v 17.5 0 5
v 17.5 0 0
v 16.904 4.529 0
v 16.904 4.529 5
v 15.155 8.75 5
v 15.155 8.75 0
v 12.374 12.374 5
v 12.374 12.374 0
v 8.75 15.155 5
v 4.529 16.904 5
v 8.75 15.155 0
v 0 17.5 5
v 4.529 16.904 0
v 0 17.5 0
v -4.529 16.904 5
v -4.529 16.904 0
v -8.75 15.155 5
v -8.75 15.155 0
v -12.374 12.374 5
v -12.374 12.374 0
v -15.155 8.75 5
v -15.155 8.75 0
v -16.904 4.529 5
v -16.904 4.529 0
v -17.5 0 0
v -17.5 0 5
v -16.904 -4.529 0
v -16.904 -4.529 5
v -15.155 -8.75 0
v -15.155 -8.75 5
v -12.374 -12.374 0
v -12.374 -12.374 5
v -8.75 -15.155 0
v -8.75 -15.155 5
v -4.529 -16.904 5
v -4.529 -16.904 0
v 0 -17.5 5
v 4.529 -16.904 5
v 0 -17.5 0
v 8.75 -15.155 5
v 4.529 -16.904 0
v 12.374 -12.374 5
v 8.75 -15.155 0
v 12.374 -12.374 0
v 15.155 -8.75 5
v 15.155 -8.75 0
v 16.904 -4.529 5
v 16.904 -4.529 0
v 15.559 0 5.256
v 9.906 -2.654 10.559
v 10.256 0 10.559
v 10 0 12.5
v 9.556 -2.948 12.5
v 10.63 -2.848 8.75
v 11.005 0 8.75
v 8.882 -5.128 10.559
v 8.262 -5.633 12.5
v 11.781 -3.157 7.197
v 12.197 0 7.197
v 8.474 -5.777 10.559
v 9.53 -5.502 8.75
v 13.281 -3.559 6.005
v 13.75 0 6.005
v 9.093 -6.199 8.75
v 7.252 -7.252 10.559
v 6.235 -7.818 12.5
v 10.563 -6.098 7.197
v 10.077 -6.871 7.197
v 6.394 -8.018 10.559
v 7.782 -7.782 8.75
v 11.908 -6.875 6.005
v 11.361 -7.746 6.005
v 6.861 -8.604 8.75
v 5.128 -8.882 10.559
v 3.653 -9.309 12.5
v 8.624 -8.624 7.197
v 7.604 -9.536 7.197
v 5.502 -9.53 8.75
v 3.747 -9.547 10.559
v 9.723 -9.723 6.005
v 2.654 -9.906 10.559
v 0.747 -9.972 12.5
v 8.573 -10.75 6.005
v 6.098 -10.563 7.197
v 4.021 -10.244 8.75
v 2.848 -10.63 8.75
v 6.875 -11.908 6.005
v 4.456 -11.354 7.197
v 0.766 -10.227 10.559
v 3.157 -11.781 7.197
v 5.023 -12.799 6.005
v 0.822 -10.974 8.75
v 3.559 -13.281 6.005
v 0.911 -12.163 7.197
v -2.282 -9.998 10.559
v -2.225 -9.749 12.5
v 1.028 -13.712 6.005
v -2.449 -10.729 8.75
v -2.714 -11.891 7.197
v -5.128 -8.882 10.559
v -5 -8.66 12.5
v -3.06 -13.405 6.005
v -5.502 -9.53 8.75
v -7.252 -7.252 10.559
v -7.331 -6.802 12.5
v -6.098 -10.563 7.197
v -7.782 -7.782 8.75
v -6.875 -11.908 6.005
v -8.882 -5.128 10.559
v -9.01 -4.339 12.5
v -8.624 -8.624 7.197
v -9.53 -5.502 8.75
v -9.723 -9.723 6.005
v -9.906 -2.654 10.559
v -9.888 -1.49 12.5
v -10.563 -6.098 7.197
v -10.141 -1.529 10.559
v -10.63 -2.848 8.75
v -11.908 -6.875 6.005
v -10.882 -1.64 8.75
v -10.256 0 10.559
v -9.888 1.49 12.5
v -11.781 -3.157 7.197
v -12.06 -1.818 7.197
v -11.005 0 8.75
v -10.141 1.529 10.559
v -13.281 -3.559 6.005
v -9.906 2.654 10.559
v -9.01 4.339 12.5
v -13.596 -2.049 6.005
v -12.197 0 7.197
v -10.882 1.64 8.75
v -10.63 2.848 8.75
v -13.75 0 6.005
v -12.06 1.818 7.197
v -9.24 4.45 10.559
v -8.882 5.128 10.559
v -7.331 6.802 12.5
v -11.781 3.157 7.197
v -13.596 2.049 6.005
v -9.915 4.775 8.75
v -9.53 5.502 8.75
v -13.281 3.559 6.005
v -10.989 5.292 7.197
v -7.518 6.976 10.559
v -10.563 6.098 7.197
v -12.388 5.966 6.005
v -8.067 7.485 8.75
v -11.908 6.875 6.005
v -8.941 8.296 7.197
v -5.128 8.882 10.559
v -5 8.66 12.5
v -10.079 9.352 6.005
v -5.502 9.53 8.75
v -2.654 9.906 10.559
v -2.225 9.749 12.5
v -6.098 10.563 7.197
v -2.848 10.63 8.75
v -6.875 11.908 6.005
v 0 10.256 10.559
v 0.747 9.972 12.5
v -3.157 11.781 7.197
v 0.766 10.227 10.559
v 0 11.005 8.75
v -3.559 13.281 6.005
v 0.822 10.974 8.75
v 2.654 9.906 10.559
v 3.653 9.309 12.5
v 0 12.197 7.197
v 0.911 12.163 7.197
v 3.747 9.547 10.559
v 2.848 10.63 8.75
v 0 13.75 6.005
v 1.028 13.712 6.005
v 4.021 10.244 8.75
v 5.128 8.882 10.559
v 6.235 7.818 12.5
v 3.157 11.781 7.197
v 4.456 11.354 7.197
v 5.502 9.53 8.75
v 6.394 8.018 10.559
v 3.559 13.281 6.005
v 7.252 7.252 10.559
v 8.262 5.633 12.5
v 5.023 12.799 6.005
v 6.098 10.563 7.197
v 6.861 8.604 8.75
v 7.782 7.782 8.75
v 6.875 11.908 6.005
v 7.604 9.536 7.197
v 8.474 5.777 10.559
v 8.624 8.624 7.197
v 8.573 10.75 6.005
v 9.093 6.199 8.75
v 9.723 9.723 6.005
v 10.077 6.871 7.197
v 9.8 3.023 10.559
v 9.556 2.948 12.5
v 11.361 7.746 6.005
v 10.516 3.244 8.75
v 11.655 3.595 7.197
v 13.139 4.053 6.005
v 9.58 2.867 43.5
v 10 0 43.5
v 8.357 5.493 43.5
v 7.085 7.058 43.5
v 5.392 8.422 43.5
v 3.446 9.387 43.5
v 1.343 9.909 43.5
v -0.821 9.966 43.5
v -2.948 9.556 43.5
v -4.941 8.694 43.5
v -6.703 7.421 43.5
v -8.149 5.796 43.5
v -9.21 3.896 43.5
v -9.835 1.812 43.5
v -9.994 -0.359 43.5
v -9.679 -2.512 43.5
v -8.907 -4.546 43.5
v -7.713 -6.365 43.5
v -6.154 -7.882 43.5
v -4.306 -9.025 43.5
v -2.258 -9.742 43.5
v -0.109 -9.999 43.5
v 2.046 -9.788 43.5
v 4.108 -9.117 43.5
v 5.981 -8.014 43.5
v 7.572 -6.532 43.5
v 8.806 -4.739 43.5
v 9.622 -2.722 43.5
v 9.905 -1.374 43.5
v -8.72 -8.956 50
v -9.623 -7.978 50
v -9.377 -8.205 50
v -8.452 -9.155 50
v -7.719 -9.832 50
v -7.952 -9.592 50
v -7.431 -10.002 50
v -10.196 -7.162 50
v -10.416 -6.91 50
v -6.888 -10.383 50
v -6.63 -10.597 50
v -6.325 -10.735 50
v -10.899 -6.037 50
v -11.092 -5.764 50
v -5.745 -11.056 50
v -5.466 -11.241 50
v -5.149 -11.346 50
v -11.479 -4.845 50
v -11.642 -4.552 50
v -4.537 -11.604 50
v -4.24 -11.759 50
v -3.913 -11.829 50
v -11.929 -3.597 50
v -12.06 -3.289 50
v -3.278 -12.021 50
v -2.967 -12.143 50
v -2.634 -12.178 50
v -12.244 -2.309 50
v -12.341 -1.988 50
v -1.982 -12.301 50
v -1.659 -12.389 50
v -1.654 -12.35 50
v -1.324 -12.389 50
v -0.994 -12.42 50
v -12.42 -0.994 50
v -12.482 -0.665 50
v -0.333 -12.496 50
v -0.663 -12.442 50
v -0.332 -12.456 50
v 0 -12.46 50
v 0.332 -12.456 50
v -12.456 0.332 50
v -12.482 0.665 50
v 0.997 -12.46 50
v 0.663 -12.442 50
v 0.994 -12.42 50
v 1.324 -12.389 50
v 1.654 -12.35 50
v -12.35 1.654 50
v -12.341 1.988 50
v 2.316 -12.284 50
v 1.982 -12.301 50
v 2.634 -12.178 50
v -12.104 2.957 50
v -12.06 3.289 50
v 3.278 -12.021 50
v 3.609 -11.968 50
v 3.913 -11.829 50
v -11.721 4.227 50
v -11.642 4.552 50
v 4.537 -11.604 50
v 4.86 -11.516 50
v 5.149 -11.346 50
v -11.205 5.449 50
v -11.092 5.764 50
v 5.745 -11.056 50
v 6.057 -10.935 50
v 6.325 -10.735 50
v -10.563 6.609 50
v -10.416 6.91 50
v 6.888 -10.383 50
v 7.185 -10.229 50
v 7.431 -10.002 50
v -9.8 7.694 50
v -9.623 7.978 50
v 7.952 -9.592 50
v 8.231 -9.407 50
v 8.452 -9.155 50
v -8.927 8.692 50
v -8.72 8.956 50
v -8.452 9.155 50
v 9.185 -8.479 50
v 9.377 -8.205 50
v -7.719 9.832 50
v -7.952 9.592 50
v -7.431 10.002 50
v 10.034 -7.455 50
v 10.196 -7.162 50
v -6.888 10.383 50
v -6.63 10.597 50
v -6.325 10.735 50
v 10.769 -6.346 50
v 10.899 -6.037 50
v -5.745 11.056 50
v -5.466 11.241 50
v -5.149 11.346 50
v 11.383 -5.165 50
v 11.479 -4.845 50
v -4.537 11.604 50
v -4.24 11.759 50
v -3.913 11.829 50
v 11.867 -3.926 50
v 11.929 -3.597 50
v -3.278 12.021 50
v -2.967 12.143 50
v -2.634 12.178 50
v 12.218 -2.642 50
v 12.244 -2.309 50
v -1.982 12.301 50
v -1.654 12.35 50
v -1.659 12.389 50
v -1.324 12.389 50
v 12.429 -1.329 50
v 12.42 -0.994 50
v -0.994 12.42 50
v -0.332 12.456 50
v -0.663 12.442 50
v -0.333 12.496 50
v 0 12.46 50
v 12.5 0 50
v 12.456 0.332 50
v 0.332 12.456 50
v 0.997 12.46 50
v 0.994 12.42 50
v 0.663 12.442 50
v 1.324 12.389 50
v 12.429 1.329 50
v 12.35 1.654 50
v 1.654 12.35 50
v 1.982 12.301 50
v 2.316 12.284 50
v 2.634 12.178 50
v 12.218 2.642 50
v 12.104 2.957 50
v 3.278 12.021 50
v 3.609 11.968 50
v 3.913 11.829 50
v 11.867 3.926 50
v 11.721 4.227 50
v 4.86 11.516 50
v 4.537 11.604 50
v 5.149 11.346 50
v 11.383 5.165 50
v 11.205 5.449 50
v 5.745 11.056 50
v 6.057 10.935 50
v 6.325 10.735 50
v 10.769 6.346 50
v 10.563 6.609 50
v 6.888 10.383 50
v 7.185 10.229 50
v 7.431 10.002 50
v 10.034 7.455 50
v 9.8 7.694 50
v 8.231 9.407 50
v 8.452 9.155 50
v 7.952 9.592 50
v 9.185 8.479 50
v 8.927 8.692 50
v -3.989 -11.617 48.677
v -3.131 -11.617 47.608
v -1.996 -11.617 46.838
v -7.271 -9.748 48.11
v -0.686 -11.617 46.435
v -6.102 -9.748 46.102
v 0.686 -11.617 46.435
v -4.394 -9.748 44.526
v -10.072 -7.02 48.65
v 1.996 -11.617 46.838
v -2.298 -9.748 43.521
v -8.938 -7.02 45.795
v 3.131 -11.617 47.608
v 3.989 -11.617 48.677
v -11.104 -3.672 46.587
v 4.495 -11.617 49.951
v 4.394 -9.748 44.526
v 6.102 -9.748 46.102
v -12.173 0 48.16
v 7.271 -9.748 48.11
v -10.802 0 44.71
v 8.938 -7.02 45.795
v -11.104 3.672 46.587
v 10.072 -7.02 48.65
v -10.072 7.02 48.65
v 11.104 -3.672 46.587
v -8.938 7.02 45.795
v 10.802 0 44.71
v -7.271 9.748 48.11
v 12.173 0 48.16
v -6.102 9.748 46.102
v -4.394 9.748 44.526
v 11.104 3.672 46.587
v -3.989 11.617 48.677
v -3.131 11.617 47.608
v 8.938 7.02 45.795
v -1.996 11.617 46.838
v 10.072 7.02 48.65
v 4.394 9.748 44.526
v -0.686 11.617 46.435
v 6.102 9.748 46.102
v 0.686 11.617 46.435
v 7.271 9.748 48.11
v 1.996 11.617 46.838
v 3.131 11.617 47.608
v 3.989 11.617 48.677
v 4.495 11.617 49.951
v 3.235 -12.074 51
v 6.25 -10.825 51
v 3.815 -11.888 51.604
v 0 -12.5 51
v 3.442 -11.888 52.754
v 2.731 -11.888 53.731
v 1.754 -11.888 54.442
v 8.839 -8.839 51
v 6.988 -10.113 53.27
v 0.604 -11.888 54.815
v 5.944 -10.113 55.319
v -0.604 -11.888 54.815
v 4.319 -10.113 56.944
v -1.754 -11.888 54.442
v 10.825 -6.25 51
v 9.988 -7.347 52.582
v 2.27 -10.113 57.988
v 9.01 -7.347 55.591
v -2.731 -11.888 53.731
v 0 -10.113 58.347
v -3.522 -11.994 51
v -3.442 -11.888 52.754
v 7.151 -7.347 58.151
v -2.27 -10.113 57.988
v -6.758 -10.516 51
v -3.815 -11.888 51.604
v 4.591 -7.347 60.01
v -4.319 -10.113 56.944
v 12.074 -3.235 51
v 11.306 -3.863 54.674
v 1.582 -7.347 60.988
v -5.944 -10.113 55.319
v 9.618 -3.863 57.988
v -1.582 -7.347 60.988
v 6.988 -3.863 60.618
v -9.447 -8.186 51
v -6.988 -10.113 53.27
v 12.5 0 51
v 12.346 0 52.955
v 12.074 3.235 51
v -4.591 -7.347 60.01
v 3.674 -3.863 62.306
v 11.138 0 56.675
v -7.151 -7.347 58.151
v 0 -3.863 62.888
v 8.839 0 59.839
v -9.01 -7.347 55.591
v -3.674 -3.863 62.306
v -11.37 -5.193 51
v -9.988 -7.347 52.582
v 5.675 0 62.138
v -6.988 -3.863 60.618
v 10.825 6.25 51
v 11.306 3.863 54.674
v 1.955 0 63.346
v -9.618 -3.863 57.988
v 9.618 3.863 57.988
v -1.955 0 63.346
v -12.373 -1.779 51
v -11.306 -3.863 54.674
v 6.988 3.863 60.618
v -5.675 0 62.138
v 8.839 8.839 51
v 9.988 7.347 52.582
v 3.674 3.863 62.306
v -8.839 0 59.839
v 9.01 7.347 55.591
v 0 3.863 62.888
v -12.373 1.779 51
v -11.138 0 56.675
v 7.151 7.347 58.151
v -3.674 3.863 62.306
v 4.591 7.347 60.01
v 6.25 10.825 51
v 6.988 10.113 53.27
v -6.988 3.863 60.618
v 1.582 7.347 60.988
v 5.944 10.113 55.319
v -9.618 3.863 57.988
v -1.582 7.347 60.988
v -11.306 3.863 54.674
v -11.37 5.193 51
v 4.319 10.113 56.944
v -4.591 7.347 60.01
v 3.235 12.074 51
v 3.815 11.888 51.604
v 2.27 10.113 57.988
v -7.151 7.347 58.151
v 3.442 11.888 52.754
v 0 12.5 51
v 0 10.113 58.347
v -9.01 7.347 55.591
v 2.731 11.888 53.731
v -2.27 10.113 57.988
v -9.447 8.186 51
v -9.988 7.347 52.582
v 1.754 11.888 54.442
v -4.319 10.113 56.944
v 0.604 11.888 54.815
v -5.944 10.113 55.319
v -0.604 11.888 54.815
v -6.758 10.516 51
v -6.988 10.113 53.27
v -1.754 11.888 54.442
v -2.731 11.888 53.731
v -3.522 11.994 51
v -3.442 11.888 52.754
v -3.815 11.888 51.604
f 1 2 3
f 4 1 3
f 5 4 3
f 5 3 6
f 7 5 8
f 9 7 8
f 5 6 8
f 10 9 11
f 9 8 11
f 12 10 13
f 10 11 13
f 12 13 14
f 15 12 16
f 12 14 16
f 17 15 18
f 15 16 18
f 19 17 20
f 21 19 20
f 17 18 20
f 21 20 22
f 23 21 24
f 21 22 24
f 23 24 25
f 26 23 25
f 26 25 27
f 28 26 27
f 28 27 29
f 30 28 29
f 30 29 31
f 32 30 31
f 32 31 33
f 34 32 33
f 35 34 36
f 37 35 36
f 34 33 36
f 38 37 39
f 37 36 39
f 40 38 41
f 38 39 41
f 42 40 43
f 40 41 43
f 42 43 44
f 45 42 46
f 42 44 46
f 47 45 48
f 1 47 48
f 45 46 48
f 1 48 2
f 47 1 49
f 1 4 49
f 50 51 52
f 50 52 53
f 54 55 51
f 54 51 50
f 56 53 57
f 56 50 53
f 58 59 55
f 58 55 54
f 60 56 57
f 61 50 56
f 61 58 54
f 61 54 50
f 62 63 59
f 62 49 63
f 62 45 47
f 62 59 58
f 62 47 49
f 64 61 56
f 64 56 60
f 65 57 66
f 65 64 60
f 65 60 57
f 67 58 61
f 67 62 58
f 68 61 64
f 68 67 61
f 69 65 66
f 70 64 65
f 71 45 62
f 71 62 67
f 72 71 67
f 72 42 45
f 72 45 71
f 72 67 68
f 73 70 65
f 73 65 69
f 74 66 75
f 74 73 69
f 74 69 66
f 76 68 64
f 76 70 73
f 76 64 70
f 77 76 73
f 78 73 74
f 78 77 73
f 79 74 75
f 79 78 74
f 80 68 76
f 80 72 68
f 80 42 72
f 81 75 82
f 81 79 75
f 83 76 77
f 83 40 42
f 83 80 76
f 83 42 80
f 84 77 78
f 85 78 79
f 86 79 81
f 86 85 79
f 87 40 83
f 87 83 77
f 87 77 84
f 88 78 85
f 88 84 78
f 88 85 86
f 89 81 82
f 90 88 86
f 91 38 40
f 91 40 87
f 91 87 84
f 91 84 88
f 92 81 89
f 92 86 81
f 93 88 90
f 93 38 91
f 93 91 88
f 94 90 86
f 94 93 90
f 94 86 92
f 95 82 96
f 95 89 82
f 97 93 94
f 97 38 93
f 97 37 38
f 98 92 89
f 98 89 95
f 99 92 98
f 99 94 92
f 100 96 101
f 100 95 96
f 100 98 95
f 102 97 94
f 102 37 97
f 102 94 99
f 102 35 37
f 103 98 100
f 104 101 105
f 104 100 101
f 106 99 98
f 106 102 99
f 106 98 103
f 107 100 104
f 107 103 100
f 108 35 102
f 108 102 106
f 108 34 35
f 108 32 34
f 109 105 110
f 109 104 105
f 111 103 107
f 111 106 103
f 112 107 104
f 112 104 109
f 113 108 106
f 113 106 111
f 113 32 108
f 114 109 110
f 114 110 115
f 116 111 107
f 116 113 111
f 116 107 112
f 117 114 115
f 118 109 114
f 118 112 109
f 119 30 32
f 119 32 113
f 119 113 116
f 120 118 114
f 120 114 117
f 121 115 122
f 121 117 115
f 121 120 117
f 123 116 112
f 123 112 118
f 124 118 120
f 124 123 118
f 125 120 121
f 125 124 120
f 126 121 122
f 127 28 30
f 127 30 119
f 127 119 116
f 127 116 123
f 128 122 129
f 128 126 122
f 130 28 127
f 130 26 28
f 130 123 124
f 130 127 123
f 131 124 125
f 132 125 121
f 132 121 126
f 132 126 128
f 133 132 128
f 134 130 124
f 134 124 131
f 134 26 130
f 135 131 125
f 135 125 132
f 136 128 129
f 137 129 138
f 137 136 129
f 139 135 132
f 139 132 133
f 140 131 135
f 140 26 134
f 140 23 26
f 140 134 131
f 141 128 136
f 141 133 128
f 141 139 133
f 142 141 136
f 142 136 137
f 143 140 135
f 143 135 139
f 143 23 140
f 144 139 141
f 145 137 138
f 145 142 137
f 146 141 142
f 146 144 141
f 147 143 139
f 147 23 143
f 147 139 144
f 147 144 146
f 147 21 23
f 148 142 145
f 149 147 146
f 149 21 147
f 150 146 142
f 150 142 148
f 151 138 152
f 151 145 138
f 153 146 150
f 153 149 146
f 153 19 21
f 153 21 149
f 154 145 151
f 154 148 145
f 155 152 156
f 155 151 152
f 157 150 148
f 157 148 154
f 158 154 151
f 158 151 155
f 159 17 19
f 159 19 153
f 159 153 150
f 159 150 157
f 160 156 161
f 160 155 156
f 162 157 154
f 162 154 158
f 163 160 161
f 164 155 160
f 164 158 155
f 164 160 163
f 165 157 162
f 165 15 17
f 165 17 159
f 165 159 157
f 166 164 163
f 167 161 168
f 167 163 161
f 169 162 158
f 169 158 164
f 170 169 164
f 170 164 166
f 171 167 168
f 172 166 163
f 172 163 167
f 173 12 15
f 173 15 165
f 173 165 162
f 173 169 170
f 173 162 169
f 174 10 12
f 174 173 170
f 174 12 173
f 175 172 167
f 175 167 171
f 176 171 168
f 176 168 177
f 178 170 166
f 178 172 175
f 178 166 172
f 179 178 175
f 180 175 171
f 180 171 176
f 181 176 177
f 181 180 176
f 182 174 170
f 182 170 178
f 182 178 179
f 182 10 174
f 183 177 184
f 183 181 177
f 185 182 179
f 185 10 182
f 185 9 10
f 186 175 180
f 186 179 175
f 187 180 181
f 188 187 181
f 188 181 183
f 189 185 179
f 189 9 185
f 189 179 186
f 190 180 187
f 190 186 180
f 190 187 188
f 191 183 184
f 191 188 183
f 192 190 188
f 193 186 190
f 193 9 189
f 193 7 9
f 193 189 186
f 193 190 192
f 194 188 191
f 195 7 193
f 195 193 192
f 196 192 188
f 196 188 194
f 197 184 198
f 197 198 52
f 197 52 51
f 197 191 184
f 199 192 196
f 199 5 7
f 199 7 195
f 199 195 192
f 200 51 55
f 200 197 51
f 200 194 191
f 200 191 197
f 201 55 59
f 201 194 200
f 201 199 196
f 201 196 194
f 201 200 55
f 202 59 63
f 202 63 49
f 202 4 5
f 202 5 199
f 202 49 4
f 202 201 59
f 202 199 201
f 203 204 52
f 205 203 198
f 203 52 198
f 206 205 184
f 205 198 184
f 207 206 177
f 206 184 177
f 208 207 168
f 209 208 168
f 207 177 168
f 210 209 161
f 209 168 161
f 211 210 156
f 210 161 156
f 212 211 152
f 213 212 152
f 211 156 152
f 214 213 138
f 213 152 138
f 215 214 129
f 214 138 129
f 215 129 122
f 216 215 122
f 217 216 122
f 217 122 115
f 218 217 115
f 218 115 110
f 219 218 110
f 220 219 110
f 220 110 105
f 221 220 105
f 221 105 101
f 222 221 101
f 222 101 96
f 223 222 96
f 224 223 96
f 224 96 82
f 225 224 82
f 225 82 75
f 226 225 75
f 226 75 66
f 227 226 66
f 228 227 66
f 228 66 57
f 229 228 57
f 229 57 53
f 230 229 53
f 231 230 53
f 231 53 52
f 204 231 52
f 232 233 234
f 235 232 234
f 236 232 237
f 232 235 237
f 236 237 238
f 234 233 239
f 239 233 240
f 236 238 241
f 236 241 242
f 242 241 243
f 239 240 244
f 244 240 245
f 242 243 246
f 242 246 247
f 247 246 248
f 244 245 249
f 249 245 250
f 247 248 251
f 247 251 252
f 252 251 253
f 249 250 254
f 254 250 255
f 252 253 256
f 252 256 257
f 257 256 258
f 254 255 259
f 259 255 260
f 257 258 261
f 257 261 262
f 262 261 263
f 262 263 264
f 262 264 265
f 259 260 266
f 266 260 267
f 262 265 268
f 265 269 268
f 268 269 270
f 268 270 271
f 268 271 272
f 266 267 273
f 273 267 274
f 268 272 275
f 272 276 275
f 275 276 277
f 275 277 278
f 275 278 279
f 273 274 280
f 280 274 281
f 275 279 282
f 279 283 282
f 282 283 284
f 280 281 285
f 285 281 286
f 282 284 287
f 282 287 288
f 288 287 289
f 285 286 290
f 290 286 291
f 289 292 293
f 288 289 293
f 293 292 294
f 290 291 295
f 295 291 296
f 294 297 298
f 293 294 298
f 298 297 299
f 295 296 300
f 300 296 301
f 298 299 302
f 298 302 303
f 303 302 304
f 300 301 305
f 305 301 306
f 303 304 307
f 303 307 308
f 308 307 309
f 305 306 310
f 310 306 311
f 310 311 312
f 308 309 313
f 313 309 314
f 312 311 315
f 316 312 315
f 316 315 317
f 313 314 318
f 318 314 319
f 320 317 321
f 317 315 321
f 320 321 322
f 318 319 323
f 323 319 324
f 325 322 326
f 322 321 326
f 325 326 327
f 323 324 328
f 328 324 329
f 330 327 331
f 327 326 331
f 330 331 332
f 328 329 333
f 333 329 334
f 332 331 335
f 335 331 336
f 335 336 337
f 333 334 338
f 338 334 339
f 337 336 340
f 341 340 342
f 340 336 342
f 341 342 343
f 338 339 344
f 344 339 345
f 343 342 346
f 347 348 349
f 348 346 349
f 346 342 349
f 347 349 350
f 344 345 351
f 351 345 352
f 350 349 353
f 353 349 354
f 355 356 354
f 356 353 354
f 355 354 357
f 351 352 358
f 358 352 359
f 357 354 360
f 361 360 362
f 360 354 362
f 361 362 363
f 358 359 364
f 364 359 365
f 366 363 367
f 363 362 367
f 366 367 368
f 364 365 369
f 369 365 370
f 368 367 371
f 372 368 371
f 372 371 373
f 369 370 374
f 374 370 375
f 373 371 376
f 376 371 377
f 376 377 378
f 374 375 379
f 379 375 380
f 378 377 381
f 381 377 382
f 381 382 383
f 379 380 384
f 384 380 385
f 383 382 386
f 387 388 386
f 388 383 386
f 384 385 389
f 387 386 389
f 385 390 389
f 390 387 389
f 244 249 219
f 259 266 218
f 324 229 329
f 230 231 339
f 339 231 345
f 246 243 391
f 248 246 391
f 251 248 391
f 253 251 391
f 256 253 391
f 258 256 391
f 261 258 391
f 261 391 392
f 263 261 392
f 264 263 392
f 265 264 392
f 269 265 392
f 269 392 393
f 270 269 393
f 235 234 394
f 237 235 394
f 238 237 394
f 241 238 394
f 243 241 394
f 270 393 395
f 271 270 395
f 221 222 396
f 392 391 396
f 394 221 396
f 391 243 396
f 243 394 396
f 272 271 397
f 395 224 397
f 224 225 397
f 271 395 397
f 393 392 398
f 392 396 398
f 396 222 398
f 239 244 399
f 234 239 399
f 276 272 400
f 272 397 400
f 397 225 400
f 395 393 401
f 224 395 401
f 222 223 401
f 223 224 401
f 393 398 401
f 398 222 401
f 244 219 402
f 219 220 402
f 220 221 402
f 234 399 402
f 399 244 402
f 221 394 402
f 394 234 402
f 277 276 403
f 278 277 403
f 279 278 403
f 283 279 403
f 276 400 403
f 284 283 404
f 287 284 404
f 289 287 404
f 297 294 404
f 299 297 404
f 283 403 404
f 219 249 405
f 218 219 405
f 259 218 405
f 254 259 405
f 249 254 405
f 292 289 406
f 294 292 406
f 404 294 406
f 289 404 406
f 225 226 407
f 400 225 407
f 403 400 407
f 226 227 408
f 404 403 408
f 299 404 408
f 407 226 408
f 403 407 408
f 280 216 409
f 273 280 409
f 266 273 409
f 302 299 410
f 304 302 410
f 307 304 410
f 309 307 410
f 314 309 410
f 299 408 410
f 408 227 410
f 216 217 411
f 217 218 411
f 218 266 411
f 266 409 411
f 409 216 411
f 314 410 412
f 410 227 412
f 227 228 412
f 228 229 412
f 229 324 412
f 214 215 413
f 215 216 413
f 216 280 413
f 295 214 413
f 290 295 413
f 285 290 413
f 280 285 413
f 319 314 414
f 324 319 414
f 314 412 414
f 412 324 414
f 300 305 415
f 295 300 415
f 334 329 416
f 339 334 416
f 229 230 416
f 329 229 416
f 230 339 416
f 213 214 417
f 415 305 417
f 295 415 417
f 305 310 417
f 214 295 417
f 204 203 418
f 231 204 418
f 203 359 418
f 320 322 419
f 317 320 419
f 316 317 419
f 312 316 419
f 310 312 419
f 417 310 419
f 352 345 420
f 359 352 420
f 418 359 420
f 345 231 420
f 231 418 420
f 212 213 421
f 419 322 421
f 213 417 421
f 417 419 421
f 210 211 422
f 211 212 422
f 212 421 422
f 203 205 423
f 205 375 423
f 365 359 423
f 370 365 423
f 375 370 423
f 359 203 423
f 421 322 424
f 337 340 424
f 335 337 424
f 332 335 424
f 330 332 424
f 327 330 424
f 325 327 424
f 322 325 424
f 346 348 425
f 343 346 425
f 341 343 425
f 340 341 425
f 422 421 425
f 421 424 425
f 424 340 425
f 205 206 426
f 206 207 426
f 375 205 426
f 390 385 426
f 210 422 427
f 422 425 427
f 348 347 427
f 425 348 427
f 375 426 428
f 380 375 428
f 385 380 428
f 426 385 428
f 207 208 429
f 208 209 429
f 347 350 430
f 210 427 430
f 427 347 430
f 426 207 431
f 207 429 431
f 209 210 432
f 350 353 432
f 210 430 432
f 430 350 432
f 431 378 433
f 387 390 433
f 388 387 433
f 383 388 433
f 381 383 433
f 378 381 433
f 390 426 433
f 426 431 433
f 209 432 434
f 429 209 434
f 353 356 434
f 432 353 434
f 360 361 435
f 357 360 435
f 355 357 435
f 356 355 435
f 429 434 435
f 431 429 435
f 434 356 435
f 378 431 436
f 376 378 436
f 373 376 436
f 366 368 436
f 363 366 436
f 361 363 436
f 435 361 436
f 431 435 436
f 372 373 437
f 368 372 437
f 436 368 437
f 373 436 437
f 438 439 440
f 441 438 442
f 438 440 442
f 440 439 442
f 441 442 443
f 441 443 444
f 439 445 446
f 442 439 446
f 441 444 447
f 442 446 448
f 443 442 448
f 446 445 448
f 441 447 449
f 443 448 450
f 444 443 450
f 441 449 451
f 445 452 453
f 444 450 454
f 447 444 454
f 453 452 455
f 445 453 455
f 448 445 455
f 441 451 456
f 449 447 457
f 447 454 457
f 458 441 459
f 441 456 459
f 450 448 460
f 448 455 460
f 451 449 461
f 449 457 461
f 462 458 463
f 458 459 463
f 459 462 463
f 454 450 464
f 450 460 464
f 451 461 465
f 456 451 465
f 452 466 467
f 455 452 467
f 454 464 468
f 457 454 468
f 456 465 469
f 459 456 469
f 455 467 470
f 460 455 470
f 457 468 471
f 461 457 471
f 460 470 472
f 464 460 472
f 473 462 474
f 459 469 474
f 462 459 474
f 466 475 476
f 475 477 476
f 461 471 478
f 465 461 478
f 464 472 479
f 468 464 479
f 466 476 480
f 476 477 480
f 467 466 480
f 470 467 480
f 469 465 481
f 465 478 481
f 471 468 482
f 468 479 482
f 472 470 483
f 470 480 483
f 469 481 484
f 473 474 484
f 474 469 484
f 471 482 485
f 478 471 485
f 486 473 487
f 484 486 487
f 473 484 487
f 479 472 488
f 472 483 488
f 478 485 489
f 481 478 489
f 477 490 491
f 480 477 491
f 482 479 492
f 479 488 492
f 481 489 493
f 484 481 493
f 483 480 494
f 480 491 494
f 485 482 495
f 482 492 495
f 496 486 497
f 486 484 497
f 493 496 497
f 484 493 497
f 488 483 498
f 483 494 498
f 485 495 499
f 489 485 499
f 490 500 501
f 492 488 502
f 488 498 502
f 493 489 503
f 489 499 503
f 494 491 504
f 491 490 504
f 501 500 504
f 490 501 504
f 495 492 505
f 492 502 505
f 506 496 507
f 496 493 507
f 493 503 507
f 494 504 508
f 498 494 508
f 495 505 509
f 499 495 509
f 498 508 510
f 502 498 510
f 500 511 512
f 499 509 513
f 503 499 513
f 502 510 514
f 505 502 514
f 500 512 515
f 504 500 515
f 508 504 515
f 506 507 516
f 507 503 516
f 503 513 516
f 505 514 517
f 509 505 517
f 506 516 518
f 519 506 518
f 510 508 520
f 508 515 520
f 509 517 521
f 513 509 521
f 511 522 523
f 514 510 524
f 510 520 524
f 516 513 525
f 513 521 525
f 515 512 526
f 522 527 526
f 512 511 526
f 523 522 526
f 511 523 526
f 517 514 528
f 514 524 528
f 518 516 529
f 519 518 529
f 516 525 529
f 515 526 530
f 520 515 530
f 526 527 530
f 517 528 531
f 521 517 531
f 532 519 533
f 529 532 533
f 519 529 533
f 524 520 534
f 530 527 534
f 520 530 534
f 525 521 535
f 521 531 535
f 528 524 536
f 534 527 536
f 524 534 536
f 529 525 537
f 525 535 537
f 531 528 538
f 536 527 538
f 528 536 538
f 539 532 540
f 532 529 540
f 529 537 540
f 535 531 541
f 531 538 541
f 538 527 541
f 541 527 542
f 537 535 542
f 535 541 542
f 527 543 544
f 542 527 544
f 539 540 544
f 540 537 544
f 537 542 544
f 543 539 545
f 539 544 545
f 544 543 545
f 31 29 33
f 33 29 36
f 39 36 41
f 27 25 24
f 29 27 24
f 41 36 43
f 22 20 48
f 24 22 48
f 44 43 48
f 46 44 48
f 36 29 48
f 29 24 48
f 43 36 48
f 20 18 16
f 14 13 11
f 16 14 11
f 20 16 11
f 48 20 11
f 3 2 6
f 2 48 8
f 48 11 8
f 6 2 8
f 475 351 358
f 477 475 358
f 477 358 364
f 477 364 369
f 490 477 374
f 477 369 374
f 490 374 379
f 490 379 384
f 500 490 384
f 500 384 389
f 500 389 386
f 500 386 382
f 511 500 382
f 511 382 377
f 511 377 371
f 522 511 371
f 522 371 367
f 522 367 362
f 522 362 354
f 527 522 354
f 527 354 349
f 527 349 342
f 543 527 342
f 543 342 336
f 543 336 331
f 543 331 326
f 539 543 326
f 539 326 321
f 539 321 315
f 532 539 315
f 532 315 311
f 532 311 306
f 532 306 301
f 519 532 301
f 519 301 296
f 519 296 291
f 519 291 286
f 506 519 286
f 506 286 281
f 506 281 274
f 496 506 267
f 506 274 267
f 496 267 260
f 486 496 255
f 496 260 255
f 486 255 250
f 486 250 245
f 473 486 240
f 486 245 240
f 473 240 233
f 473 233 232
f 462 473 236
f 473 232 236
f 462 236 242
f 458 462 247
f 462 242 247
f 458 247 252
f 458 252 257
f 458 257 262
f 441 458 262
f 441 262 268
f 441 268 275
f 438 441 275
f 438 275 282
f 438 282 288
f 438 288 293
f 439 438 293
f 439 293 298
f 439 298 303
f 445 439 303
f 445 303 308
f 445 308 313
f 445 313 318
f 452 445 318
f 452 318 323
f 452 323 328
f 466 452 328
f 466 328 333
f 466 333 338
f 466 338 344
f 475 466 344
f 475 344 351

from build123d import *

# Parameters (mm, degrees)
SKETCH1_R           = 17.5
BOSS_EXTRUDE1_DEPTH = 5
SKETCH3_R           = 10
BOSS_EXTRUDE2_DEPTH = 50
SKETCH6_R           = 12.5
BOSS_EXTRUDE3_DEPTH = 1
FILLET1_R           = 7.5


with BuildPart() as part:
    # Sketch1 → Boss-Extrude1 (new body)
    with BuildSketch(Plane.XY):
        Circle(SKETCH1_R)
    extrude(amount=BOSS_EXTRUDE1_DEPTH)

    # Sketch3 → Boss-Extrude2 (add)
    with BuildSketch(Plane.XY):
        Circle(SKETCH3_R)
    extrude(amount=BOSS_EXTRUDE2_DEPTH)

    # Sketch6 → Boss-Extrude3 (add)
    with BuildSketch(Plane.XY.offset(50)):
        Circle(SKETCH6_R)
    extrude(amount=BOSS_EXTRUDE3_DEPTH)

    # Sketch7 → Revolve5 (revolve)
    with BuildSketch(Plane.XY.offset(51)):
        with BuildLine():
            Line((0, 12.5), (0, -12.5))
            ThreePointArc((0, -12.5), (-12.5, 0), (0, 12.5))
        make_face()
    revolve(axis=Axis((0, 12.5, 51), (0, -1, 0)))

    # Fillet1
    fillet1_edges = [part.edges().sort_by_distance(p)[0] for p in [
        (-10, 0, 5),
    ]]
    fillet(fillet1_edges, radius=FILLET1_R - 0.0001)  # a hair under: the kernel refuses the full size


solid = part.part
